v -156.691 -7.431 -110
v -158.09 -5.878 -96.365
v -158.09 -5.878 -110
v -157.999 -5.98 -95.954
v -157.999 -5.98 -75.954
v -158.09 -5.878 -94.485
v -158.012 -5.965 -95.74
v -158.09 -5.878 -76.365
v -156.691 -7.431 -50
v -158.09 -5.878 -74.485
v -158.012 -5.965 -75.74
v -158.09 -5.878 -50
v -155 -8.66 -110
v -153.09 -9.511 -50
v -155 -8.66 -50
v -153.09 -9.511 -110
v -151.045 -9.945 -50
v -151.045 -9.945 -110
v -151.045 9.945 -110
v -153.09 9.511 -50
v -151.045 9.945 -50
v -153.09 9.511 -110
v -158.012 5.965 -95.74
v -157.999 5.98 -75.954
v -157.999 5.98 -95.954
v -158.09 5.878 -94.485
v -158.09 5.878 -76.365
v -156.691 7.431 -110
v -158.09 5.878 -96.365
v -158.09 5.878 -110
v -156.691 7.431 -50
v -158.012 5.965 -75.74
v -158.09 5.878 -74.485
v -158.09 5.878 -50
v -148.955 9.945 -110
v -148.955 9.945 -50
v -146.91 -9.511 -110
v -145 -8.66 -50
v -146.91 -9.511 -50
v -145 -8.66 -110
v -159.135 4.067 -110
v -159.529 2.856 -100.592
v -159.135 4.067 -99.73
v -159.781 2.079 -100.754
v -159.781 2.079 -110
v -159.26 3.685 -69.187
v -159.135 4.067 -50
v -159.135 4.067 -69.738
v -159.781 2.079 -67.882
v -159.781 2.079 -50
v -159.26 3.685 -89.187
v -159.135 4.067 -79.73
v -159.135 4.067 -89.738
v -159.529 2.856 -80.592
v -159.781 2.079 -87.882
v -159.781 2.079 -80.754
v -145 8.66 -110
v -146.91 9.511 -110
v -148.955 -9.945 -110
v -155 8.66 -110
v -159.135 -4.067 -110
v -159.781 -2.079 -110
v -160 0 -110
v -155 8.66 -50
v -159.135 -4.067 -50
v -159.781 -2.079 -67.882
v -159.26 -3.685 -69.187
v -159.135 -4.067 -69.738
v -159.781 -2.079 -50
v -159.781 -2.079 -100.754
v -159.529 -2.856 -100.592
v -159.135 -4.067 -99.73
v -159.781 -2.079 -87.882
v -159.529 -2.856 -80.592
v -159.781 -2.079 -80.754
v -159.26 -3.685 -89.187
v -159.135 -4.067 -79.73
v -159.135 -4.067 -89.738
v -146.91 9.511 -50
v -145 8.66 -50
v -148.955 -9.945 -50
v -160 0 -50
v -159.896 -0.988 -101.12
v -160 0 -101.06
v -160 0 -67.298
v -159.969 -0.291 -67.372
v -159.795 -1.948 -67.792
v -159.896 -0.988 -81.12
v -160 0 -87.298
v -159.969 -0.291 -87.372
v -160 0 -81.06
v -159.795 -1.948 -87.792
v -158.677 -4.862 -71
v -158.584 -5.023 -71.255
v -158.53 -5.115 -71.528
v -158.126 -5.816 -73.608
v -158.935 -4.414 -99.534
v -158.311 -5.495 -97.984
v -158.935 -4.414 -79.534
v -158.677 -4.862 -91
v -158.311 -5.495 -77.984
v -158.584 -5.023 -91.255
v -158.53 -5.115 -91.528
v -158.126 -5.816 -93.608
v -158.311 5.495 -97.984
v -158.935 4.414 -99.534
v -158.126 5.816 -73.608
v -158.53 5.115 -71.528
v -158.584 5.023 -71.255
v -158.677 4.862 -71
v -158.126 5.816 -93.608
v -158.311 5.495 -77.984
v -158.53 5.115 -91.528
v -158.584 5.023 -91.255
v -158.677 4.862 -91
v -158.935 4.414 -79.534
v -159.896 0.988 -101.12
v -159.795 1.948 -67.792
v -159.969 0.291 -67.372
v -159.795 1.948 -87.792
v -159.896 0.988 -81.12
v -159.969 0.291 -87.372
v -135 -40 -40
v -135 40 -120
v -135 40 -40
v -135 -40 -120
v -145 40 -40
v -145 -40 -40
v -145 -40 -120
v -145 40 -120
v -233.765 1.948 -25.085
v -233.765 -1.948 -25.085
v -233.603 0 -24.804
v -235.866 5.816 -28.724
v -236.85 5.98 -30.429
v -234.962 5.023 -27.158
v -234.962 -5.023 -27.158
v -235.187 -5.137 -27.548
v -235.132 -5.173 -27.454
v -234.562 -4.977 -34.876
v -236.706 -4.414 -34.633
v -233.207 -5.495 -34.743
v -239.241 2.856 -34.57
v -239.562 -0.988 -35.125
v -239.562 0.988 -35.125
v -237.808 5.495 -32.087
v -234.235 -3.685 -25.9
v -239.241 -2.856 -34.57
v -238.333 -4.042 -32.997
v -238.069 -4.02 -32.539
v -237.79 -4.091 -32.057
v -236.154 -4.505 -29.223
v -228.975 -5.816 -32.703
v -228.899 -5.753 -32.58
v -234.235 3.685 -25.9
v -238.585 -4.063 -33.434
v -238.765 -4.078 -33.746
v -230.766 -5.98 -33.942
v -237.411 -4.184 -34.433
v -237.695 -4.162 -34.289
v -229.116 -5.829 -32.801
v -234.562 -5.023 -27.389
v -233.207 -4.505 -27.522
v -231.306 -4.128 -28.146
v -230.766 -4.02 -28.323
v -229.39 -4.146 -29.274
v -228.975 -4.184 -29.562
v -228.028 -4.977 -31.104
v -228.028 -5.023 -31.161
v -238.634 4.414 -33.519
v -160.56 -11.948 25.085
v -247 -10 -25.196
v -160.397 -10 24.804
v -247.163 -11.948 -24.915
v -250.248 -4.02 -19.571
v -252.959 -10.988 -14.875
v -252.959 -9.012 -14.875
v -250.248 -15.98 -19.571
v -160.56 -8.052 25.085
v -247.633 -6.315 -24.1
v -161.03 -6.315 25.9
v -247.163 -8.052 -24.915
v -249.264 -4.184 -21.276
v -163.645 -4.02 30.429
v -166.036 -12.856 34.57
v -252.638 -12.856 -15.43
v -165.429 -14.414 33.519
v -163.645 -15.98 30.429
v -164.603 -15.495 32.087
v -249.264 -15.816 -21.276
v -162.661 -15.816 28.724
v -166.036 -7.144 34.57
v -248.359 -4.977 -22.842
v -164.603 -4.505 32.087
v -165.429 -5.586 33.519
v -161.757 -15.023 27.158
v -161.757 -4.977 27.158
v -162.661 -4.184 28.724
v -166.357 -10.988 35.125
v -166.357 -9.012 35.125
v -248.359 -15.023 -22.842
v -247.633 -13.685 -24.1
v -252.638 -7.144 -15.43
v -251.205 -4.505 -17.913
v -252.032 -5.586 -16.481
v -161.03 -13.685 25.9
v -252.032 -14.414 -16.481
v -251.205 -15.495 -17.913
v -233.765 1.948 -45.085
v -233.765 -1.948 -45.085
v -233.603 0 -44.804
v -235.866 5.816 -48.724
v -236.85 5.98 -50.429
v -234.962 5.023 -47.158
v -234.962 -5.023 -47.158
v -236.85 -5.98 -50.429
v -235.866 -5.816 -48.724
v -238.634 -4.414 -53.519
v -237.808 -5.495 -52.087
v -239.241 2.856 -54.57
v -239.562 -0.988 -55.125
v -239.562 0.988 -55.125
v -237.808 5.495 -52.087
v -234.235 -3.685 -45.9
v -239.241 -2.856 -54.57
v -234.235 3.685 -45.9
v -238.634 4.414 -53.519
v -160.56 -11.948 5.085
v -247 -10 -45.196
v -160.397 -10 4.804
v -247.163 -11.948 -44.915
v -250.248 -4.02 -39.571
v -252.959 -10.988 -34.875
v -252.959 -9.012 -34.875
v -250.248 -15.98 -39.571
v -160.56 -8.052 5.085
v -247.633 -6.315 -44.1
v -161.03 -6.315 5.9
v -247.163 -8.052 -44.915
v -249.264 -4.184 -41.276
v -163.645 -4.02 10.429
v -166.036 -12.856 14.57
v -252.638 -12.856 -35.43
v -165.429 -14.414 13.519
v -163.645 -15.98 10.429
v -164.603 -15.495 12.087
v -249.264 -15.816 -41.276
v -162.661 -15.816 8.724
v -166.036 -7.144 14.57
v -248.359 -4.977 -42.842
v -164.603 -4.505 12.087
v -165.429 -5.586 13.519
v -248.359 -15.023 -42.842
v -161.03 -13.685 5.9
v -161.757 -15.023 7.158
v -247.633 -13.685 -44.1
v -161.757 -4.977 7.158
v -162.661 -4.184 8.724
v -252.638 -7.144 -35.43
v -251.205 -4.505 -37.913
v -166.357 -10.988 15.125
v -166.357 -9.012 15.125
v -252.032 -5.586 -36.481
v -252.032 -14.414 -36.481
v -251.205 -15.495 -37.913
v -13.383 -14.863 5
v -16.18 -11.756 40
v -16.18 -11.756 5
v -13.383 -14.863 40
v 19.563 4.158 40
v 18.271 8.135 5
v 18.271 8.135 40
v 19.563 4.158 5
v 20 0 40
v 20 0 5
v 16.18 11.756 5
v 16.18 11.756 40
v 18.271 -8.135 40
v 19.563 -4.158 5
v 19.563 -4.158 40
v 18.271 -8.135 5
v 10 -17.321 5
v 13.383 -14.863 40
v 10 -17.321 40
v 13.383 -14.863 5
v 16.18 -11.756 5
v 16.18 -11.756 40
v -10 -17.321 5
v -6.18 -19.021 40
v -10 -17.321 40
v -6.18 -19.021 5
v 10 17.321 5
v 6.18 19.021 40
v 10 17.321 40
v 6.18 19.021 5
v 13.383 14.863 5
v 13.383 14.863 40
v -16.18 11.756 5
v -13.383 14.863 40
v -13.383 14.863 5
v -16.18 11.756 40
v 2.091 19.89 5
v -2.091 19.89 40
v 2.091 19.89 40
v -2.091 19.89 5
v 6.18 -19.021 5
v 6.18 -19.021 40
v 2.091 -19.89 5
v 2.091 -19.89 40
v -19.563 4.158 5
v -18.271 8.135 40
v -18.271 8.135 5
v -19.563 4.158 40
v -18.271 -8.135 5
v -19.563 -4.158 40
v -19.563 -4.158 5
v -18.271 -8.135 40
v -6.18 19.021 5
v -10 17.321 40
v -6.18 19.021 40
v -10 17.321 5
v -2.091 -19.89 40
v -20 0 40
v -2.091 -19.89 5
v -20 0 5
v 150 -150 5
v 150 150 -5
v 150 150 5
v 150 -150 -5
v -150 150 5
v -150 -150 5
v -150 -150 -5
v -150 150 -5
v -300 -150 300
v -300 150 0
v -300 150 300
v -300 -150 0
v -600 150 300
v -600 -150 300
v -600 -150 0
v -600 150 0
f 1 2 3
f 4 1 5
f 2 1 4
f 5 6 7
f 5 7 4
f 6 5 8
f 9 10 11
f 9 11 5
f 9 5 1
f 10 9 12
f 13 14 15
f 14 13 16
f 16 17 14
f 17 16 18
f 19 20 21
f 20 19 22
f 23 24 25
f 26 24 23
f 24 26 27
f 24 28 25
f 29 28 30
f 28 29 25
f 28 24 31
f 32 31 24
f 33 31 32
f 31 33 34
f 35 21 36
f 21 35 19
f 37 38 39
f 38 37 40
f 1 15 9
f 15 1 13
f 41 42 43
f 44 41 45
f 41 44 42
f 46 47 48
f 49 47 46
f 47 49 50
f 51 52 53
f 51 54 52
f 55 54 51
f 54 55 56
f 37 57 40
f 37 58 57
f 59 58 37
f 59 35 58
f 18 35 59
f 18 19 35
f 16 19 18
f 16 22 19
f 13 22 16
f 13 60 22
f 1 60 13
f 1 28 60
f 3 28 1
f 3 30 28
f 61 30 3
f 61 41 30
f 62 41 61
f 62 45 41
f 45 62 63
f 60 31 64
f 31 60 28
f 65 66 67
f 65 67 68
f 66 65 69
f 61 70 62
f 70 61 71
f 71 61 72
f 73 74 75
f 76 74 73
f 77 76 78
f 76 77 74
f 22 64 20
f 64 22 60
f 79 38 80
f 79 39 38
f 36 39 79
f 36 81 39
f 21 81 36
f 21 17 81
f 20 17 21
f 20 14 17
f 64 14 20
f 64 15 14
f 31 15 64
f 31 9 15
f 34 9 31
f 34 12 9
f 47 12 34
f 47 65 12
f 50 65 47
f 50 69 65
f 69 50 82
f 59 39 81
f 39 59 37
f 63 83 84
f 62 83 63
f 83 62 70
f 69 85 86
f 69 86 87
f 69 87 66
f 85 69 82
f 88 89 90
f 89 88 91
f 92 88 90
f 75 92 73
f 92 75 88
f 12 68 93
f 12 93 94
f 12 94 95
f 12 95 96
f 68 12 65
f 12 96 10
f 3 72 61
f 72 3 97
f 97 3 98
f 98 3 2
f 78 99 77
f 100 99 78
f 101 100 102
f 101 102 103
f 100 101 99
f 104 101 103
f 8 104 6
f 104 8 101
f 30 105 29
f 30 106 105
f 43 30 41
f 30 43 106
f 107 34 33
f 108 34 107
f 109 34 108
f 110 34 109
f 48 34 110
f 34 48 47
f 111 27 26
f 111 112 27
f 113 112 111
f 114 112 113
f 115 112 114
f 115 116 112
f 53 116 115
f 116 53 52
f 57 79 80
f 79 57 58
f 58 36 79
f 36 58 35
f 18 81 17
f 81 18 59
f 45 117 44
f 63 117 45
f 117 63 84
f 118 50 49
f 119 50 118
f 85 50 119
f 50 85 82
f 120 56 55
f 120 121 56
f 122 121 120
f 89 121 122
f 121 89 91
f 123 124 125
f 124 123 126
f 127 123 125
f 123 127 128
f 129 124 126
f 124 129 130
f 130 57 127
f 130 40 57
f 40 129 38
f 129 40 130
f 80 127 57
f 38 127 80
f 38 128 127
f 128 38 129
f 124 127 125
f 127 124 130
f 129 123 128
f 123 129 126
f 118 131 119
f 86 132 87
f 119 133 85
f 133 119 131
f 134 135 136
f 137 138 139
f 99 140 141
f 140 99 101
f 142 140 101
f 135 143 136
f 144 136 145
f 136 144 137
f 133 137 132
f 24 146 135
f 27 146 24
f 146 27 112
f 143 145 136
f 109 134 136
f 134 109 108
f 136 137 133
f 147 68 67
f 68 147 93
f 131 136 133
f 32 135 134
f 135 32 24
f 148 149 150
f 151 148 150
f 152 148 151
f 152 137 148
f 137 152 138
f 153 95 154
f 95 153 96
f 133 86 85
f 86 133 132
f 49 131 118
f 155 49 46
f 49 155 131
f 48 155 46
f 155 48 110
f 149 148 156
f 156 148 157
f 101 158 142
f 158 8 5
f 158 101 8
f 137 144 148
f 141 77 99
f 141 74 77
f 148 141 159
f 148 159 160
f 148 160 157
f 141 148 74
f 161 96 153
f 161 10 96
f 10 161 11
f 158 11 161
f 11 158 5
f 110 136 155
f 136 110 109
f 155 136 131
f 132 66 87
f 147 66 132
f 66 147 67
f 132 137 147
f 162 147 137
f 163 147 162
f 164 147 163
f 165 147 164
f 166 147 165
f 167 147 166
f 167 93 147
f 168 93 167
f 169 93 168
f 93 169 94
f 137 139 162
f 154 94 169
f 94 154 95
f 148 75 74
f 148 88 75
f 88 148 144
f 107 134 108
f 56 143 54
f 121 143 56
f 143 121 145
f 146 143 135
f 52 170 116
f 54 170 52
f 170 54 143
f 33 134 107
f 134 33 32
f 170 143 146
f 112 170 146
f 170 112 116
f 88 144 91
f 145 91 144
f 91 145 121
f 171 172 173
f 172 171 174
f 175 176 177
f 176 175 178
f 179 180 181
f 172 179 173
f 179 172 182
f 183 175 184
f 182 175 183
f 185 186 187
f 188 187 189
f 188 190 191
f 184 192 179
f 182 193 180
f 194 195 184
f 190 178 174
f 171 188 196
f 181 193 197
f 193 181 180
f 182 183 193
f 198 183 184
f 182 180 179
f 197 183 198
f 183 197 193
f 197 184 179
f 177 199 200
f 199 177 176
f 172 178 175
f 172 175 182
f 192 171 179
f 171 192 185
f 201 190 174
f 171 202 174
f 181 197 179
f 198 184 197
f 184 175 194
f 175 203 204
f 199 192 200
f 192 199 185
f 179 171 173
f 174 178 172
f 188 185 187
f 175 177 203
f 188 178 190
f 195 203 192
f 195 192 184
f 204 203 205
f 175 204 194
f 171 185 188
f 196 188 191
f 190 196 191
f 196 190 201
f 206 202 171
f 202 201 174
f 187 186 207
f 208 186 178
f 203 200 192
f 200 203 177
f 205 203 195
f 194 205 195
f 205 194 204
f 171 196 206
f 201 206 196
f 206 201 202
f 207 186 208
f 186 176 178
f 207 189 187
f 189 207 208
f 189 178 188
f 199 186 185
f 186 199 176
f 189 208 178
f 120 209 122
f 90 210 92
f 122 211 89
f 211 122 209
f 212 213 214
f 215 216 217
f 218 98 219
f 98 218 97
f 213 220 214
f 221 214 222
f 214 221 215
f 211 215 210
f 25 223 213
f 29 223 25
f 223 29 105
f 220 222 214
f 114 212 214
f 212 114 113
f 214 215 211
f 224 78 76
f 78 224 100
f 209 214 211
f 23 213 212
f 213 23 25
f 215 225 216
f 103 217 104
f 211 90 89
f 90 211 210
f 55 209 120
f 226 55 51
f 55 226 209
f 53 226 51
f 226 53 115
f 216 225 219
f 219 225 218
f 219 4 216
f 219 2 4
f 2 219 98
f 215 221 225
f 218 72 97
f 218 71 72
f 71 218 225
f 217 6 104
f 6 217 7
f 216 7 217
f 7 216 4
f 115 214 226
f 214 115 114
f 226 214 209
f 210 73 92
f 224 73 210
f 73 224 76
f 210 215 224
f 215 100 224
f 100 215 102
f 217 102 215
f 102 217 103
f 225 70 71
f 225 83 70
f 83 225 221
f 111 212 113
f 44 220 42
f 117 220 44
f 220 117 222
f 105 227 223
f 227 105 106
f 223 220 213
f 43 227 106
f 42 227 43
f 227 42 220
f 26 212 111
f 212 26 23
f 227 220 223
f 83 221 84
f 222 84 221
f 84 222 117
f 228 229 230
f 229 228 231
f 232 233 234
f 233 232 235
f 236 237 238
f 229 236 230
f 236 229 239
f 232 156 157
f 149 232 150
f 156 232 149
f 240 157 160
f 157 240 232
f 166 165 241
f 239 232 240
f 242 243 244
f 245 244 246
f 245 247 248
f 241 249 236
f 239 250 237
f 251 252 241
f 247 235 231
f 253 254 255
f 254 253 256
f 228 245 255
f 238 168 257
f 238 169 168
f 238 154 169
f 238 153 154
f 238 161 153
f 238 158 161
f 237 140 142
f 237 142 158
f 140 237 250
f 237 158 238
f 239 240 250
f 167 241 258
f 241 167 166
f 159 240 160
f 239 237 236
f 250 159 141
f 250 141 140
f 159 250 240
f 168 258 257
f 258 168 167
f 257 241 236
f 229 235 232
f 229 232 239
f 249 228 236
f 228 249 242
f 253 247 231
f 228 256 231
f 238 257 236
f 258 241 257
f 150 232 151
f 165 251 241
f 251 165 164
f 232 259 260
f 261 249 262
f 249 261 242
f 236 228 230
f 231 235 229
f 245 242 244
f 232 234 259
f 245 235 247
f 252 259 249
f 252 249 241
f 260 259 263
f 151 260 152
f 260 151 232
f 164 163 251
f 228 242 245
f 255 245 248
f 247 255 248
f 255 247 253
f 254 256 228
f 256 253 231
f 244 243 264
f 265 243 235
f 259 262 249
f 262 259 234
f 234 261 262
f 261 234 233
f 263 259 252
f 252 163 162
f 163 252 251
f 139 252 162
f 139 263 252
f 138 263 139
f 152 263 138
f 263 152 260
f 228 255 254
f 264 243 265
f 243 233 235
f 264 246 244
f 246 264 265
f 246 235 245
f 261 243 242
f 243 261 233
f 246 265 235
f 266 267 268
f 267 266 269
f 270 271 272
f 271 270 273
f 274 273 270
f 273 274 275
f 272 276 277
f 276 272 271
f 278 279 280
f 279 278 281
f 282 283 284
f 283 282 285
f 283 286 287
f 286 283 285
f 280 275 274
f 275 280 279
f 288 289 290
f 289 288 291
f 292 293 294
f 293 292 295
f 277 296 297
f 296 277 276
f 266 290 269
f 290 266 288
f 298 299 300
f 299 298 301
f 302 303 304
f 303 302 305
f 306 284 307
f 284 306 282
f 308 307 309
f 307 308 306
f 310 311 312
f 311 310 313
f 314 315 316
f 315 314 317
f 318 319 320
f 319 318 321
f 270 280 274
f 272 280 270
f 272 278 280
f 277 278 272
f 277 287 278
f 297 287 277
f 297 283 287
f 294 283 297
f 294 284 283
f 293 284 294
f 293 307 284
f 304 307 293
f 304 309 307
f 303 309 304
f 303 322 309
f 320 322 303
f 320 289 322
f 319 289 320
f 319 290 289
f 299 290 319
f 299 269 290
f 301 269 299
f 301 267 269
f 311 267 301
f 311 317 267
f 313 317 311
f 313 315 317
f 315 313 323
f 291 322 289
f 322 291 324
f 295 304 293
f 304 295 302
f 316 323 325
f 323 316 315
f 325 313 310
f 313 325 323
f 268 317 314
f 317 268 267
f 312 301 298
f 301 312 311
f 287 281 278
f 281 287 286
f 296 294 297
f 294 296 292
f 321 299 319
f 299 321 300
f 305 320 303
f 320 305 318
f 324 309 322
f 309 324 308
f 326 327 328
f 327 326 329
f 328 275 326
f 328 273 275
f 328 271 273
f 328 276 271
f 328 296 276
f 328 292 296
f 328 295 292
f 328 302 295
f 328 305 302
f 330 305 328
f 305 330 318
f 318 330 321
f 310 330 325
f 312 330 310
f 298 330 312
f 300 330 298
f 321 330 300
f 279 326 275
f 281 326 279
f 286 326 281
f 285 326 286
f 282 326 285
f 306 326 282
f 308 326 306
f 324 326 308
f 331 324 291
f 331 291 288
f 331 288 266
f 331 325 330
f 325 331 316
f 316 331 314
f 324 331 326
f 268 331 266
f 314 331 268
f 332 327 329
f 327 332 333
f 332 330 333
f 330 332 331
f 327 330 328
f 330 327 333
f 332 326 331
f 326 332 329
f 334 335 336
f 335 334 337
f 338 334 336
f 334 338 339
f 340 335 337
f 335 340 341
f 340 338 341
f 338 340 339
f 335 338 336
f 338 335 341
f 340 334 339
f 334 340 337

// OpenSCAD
//nyu tandon - VIP - RDT
//created by aj3944 
//Task Description
//design a bot to pick up a box and place it higher than it initially was


// Bot Design
//wheels
module wheel(x,y,z,theta=0){
    translate([x,y,z])
    rotate([90,0,theta])
    cylinder(h=30,r=50,center=true);
}



//chassis
module chassis(){
    translate([-10,0,0])
    rotate([90,0,0])
    cylinder(h=600,r=10,center=true);
    translate([5,310,0])
    rotate([0,0,60])
    rotate([90,0,0])
    cylinder(h=600,r=10,center=false);
    translate([5,-310,0])
    rotate([0,0,120])
    rotate([90,0,0])
    cylinder(h=600,r=10,center=false);
}

module bodyframe(){
    translate([0,0,15])
    rotate([30,10,0])
    cylinder(h=400,r=10,center=false);
    translate([0,0,15])
    rotate([-30,10,0])
    cylinder(h=400,r=10,center=false);
    
    
    translate([0,-300,15])
    rotate([0,20,60])
    cylinder(h=1000,r=10,center=false);    


}
module bodyplate(){
    translate([170,0,180])
    cylinder(h=20,r=200,center=true);
    translate([170,0,350])
    cylinder(h=20,r=250,center=true);
    
    
    translate([173,0,900])
    sphere(70);
}


module electronics(){
    //battery
    color("blue")  
    translate([90,0,220])
    cube([60,140,40],center=true);

    color("green")  
    translate([220,0,220])
    cube([110,110,40],center=true);

}



module lift_bot(){
wheel(-20,330,0,30);
wheel(-20,-330,0,-30);
wheel(550,0,0,90);



electronics();



bodyplate();

chassis();

translate([260,160,0])
rotate([0,0,-120])
bodyframe();

translate([260,-160,0])
rotate([0,0,120])
bodyframe();
bodyframe();

}




//powertrain
module hydraulic_tank(){
    translate([380,0,80])
    hull(){  
        translate([0,-100,0])
        sphere(80);
        translate([0,100,0])
        sphere(80);
    }
}
module lift_arm(){
    
    translate([0,30,1000])
    rotate([0,0,90])
    rotate([90,0,0])
    cylinder(h = 1000, r = 12, center = true);
    translate([0,-30,1000])
    rotate([0,0,90])
    rotate([90,0,0])
    cylinder(h = 1000, r = 12, center = true);
    translate([0,30,1060])
    rotate([0,0,90])
    rotate([90,0,0])
    cylinder(h = 1000, r = 12, center = true);
    translate([0,-30,1060])
    rotate([0,0,90])
    rotate([90,0,0])
    cylinder(h = 1000, r = 12, center = true);
}
module lift_pin(x,z){
    translate([x,0,z])
    rotate([90,0,90])
    cube([110,110,20],center=true);
}   


module hydro_arm( r = 0){
        color("green")
        {
            
        cylinder(h = 300,r=40,center=true);
         translate([0,0,-120*r/100])
        cylinder(h = 300,r=20);
        }
}




module powertrain(){
    hydraulic_tank();
    lift_arm();


    translate([0,0,1120])
    rotate([0,-90,0])
    hydro_arm(10);

    lift_pin(100,1030);
    lift_pin(250,1030);
    lift_pin(490,1030);
    lift_pin(-490,1030);
    lift_pin(-390,1030);
    lift_pin(-250,1030);
    lift_pin(-90,1030);
}



module gripper_base(){
    translate([-150,0,-130])
    color("green"){


        // translate([-20,20,30])
        // rotate([0,-60,0])
        // cylinder(h = 100,r=6);
        // translate([-100,20,90])
        // rotate([0,60,0])
        // cylinder(h = 100,r=6);
        translate([-0,0,50])
        rotate([0,-60,0])
        cylinder(h = 100,r=6);
        translate([-100,-10,110])
        rotate([0,60,0])
        cylinder(h = 100,r=6);
        translate([-0,-0,30])
        rotate([0,-60,0])
        cylinder(h = 100,r=6);
        translate([-100,-10,90])
        rotate([0,60,0])
        cylinder(h = 100,r=6);

            
        translate([10,0,50]){
            translate([-10,0,0])
            cylinder(h = 60,r=10,center=true);
            cube([10,80,80],center=true);
        }
    }
}
module lift_plate(){
    
    cylinder(h=40,r=20);
    cube([300,300,10],center=true);
    
    
    gripper_base();
    
    
    
}


lift_plate();

// World
//box
module box(){
    color("red")
    translate([-600,-150,0])
    cube([300,300,300]);
}

box();
